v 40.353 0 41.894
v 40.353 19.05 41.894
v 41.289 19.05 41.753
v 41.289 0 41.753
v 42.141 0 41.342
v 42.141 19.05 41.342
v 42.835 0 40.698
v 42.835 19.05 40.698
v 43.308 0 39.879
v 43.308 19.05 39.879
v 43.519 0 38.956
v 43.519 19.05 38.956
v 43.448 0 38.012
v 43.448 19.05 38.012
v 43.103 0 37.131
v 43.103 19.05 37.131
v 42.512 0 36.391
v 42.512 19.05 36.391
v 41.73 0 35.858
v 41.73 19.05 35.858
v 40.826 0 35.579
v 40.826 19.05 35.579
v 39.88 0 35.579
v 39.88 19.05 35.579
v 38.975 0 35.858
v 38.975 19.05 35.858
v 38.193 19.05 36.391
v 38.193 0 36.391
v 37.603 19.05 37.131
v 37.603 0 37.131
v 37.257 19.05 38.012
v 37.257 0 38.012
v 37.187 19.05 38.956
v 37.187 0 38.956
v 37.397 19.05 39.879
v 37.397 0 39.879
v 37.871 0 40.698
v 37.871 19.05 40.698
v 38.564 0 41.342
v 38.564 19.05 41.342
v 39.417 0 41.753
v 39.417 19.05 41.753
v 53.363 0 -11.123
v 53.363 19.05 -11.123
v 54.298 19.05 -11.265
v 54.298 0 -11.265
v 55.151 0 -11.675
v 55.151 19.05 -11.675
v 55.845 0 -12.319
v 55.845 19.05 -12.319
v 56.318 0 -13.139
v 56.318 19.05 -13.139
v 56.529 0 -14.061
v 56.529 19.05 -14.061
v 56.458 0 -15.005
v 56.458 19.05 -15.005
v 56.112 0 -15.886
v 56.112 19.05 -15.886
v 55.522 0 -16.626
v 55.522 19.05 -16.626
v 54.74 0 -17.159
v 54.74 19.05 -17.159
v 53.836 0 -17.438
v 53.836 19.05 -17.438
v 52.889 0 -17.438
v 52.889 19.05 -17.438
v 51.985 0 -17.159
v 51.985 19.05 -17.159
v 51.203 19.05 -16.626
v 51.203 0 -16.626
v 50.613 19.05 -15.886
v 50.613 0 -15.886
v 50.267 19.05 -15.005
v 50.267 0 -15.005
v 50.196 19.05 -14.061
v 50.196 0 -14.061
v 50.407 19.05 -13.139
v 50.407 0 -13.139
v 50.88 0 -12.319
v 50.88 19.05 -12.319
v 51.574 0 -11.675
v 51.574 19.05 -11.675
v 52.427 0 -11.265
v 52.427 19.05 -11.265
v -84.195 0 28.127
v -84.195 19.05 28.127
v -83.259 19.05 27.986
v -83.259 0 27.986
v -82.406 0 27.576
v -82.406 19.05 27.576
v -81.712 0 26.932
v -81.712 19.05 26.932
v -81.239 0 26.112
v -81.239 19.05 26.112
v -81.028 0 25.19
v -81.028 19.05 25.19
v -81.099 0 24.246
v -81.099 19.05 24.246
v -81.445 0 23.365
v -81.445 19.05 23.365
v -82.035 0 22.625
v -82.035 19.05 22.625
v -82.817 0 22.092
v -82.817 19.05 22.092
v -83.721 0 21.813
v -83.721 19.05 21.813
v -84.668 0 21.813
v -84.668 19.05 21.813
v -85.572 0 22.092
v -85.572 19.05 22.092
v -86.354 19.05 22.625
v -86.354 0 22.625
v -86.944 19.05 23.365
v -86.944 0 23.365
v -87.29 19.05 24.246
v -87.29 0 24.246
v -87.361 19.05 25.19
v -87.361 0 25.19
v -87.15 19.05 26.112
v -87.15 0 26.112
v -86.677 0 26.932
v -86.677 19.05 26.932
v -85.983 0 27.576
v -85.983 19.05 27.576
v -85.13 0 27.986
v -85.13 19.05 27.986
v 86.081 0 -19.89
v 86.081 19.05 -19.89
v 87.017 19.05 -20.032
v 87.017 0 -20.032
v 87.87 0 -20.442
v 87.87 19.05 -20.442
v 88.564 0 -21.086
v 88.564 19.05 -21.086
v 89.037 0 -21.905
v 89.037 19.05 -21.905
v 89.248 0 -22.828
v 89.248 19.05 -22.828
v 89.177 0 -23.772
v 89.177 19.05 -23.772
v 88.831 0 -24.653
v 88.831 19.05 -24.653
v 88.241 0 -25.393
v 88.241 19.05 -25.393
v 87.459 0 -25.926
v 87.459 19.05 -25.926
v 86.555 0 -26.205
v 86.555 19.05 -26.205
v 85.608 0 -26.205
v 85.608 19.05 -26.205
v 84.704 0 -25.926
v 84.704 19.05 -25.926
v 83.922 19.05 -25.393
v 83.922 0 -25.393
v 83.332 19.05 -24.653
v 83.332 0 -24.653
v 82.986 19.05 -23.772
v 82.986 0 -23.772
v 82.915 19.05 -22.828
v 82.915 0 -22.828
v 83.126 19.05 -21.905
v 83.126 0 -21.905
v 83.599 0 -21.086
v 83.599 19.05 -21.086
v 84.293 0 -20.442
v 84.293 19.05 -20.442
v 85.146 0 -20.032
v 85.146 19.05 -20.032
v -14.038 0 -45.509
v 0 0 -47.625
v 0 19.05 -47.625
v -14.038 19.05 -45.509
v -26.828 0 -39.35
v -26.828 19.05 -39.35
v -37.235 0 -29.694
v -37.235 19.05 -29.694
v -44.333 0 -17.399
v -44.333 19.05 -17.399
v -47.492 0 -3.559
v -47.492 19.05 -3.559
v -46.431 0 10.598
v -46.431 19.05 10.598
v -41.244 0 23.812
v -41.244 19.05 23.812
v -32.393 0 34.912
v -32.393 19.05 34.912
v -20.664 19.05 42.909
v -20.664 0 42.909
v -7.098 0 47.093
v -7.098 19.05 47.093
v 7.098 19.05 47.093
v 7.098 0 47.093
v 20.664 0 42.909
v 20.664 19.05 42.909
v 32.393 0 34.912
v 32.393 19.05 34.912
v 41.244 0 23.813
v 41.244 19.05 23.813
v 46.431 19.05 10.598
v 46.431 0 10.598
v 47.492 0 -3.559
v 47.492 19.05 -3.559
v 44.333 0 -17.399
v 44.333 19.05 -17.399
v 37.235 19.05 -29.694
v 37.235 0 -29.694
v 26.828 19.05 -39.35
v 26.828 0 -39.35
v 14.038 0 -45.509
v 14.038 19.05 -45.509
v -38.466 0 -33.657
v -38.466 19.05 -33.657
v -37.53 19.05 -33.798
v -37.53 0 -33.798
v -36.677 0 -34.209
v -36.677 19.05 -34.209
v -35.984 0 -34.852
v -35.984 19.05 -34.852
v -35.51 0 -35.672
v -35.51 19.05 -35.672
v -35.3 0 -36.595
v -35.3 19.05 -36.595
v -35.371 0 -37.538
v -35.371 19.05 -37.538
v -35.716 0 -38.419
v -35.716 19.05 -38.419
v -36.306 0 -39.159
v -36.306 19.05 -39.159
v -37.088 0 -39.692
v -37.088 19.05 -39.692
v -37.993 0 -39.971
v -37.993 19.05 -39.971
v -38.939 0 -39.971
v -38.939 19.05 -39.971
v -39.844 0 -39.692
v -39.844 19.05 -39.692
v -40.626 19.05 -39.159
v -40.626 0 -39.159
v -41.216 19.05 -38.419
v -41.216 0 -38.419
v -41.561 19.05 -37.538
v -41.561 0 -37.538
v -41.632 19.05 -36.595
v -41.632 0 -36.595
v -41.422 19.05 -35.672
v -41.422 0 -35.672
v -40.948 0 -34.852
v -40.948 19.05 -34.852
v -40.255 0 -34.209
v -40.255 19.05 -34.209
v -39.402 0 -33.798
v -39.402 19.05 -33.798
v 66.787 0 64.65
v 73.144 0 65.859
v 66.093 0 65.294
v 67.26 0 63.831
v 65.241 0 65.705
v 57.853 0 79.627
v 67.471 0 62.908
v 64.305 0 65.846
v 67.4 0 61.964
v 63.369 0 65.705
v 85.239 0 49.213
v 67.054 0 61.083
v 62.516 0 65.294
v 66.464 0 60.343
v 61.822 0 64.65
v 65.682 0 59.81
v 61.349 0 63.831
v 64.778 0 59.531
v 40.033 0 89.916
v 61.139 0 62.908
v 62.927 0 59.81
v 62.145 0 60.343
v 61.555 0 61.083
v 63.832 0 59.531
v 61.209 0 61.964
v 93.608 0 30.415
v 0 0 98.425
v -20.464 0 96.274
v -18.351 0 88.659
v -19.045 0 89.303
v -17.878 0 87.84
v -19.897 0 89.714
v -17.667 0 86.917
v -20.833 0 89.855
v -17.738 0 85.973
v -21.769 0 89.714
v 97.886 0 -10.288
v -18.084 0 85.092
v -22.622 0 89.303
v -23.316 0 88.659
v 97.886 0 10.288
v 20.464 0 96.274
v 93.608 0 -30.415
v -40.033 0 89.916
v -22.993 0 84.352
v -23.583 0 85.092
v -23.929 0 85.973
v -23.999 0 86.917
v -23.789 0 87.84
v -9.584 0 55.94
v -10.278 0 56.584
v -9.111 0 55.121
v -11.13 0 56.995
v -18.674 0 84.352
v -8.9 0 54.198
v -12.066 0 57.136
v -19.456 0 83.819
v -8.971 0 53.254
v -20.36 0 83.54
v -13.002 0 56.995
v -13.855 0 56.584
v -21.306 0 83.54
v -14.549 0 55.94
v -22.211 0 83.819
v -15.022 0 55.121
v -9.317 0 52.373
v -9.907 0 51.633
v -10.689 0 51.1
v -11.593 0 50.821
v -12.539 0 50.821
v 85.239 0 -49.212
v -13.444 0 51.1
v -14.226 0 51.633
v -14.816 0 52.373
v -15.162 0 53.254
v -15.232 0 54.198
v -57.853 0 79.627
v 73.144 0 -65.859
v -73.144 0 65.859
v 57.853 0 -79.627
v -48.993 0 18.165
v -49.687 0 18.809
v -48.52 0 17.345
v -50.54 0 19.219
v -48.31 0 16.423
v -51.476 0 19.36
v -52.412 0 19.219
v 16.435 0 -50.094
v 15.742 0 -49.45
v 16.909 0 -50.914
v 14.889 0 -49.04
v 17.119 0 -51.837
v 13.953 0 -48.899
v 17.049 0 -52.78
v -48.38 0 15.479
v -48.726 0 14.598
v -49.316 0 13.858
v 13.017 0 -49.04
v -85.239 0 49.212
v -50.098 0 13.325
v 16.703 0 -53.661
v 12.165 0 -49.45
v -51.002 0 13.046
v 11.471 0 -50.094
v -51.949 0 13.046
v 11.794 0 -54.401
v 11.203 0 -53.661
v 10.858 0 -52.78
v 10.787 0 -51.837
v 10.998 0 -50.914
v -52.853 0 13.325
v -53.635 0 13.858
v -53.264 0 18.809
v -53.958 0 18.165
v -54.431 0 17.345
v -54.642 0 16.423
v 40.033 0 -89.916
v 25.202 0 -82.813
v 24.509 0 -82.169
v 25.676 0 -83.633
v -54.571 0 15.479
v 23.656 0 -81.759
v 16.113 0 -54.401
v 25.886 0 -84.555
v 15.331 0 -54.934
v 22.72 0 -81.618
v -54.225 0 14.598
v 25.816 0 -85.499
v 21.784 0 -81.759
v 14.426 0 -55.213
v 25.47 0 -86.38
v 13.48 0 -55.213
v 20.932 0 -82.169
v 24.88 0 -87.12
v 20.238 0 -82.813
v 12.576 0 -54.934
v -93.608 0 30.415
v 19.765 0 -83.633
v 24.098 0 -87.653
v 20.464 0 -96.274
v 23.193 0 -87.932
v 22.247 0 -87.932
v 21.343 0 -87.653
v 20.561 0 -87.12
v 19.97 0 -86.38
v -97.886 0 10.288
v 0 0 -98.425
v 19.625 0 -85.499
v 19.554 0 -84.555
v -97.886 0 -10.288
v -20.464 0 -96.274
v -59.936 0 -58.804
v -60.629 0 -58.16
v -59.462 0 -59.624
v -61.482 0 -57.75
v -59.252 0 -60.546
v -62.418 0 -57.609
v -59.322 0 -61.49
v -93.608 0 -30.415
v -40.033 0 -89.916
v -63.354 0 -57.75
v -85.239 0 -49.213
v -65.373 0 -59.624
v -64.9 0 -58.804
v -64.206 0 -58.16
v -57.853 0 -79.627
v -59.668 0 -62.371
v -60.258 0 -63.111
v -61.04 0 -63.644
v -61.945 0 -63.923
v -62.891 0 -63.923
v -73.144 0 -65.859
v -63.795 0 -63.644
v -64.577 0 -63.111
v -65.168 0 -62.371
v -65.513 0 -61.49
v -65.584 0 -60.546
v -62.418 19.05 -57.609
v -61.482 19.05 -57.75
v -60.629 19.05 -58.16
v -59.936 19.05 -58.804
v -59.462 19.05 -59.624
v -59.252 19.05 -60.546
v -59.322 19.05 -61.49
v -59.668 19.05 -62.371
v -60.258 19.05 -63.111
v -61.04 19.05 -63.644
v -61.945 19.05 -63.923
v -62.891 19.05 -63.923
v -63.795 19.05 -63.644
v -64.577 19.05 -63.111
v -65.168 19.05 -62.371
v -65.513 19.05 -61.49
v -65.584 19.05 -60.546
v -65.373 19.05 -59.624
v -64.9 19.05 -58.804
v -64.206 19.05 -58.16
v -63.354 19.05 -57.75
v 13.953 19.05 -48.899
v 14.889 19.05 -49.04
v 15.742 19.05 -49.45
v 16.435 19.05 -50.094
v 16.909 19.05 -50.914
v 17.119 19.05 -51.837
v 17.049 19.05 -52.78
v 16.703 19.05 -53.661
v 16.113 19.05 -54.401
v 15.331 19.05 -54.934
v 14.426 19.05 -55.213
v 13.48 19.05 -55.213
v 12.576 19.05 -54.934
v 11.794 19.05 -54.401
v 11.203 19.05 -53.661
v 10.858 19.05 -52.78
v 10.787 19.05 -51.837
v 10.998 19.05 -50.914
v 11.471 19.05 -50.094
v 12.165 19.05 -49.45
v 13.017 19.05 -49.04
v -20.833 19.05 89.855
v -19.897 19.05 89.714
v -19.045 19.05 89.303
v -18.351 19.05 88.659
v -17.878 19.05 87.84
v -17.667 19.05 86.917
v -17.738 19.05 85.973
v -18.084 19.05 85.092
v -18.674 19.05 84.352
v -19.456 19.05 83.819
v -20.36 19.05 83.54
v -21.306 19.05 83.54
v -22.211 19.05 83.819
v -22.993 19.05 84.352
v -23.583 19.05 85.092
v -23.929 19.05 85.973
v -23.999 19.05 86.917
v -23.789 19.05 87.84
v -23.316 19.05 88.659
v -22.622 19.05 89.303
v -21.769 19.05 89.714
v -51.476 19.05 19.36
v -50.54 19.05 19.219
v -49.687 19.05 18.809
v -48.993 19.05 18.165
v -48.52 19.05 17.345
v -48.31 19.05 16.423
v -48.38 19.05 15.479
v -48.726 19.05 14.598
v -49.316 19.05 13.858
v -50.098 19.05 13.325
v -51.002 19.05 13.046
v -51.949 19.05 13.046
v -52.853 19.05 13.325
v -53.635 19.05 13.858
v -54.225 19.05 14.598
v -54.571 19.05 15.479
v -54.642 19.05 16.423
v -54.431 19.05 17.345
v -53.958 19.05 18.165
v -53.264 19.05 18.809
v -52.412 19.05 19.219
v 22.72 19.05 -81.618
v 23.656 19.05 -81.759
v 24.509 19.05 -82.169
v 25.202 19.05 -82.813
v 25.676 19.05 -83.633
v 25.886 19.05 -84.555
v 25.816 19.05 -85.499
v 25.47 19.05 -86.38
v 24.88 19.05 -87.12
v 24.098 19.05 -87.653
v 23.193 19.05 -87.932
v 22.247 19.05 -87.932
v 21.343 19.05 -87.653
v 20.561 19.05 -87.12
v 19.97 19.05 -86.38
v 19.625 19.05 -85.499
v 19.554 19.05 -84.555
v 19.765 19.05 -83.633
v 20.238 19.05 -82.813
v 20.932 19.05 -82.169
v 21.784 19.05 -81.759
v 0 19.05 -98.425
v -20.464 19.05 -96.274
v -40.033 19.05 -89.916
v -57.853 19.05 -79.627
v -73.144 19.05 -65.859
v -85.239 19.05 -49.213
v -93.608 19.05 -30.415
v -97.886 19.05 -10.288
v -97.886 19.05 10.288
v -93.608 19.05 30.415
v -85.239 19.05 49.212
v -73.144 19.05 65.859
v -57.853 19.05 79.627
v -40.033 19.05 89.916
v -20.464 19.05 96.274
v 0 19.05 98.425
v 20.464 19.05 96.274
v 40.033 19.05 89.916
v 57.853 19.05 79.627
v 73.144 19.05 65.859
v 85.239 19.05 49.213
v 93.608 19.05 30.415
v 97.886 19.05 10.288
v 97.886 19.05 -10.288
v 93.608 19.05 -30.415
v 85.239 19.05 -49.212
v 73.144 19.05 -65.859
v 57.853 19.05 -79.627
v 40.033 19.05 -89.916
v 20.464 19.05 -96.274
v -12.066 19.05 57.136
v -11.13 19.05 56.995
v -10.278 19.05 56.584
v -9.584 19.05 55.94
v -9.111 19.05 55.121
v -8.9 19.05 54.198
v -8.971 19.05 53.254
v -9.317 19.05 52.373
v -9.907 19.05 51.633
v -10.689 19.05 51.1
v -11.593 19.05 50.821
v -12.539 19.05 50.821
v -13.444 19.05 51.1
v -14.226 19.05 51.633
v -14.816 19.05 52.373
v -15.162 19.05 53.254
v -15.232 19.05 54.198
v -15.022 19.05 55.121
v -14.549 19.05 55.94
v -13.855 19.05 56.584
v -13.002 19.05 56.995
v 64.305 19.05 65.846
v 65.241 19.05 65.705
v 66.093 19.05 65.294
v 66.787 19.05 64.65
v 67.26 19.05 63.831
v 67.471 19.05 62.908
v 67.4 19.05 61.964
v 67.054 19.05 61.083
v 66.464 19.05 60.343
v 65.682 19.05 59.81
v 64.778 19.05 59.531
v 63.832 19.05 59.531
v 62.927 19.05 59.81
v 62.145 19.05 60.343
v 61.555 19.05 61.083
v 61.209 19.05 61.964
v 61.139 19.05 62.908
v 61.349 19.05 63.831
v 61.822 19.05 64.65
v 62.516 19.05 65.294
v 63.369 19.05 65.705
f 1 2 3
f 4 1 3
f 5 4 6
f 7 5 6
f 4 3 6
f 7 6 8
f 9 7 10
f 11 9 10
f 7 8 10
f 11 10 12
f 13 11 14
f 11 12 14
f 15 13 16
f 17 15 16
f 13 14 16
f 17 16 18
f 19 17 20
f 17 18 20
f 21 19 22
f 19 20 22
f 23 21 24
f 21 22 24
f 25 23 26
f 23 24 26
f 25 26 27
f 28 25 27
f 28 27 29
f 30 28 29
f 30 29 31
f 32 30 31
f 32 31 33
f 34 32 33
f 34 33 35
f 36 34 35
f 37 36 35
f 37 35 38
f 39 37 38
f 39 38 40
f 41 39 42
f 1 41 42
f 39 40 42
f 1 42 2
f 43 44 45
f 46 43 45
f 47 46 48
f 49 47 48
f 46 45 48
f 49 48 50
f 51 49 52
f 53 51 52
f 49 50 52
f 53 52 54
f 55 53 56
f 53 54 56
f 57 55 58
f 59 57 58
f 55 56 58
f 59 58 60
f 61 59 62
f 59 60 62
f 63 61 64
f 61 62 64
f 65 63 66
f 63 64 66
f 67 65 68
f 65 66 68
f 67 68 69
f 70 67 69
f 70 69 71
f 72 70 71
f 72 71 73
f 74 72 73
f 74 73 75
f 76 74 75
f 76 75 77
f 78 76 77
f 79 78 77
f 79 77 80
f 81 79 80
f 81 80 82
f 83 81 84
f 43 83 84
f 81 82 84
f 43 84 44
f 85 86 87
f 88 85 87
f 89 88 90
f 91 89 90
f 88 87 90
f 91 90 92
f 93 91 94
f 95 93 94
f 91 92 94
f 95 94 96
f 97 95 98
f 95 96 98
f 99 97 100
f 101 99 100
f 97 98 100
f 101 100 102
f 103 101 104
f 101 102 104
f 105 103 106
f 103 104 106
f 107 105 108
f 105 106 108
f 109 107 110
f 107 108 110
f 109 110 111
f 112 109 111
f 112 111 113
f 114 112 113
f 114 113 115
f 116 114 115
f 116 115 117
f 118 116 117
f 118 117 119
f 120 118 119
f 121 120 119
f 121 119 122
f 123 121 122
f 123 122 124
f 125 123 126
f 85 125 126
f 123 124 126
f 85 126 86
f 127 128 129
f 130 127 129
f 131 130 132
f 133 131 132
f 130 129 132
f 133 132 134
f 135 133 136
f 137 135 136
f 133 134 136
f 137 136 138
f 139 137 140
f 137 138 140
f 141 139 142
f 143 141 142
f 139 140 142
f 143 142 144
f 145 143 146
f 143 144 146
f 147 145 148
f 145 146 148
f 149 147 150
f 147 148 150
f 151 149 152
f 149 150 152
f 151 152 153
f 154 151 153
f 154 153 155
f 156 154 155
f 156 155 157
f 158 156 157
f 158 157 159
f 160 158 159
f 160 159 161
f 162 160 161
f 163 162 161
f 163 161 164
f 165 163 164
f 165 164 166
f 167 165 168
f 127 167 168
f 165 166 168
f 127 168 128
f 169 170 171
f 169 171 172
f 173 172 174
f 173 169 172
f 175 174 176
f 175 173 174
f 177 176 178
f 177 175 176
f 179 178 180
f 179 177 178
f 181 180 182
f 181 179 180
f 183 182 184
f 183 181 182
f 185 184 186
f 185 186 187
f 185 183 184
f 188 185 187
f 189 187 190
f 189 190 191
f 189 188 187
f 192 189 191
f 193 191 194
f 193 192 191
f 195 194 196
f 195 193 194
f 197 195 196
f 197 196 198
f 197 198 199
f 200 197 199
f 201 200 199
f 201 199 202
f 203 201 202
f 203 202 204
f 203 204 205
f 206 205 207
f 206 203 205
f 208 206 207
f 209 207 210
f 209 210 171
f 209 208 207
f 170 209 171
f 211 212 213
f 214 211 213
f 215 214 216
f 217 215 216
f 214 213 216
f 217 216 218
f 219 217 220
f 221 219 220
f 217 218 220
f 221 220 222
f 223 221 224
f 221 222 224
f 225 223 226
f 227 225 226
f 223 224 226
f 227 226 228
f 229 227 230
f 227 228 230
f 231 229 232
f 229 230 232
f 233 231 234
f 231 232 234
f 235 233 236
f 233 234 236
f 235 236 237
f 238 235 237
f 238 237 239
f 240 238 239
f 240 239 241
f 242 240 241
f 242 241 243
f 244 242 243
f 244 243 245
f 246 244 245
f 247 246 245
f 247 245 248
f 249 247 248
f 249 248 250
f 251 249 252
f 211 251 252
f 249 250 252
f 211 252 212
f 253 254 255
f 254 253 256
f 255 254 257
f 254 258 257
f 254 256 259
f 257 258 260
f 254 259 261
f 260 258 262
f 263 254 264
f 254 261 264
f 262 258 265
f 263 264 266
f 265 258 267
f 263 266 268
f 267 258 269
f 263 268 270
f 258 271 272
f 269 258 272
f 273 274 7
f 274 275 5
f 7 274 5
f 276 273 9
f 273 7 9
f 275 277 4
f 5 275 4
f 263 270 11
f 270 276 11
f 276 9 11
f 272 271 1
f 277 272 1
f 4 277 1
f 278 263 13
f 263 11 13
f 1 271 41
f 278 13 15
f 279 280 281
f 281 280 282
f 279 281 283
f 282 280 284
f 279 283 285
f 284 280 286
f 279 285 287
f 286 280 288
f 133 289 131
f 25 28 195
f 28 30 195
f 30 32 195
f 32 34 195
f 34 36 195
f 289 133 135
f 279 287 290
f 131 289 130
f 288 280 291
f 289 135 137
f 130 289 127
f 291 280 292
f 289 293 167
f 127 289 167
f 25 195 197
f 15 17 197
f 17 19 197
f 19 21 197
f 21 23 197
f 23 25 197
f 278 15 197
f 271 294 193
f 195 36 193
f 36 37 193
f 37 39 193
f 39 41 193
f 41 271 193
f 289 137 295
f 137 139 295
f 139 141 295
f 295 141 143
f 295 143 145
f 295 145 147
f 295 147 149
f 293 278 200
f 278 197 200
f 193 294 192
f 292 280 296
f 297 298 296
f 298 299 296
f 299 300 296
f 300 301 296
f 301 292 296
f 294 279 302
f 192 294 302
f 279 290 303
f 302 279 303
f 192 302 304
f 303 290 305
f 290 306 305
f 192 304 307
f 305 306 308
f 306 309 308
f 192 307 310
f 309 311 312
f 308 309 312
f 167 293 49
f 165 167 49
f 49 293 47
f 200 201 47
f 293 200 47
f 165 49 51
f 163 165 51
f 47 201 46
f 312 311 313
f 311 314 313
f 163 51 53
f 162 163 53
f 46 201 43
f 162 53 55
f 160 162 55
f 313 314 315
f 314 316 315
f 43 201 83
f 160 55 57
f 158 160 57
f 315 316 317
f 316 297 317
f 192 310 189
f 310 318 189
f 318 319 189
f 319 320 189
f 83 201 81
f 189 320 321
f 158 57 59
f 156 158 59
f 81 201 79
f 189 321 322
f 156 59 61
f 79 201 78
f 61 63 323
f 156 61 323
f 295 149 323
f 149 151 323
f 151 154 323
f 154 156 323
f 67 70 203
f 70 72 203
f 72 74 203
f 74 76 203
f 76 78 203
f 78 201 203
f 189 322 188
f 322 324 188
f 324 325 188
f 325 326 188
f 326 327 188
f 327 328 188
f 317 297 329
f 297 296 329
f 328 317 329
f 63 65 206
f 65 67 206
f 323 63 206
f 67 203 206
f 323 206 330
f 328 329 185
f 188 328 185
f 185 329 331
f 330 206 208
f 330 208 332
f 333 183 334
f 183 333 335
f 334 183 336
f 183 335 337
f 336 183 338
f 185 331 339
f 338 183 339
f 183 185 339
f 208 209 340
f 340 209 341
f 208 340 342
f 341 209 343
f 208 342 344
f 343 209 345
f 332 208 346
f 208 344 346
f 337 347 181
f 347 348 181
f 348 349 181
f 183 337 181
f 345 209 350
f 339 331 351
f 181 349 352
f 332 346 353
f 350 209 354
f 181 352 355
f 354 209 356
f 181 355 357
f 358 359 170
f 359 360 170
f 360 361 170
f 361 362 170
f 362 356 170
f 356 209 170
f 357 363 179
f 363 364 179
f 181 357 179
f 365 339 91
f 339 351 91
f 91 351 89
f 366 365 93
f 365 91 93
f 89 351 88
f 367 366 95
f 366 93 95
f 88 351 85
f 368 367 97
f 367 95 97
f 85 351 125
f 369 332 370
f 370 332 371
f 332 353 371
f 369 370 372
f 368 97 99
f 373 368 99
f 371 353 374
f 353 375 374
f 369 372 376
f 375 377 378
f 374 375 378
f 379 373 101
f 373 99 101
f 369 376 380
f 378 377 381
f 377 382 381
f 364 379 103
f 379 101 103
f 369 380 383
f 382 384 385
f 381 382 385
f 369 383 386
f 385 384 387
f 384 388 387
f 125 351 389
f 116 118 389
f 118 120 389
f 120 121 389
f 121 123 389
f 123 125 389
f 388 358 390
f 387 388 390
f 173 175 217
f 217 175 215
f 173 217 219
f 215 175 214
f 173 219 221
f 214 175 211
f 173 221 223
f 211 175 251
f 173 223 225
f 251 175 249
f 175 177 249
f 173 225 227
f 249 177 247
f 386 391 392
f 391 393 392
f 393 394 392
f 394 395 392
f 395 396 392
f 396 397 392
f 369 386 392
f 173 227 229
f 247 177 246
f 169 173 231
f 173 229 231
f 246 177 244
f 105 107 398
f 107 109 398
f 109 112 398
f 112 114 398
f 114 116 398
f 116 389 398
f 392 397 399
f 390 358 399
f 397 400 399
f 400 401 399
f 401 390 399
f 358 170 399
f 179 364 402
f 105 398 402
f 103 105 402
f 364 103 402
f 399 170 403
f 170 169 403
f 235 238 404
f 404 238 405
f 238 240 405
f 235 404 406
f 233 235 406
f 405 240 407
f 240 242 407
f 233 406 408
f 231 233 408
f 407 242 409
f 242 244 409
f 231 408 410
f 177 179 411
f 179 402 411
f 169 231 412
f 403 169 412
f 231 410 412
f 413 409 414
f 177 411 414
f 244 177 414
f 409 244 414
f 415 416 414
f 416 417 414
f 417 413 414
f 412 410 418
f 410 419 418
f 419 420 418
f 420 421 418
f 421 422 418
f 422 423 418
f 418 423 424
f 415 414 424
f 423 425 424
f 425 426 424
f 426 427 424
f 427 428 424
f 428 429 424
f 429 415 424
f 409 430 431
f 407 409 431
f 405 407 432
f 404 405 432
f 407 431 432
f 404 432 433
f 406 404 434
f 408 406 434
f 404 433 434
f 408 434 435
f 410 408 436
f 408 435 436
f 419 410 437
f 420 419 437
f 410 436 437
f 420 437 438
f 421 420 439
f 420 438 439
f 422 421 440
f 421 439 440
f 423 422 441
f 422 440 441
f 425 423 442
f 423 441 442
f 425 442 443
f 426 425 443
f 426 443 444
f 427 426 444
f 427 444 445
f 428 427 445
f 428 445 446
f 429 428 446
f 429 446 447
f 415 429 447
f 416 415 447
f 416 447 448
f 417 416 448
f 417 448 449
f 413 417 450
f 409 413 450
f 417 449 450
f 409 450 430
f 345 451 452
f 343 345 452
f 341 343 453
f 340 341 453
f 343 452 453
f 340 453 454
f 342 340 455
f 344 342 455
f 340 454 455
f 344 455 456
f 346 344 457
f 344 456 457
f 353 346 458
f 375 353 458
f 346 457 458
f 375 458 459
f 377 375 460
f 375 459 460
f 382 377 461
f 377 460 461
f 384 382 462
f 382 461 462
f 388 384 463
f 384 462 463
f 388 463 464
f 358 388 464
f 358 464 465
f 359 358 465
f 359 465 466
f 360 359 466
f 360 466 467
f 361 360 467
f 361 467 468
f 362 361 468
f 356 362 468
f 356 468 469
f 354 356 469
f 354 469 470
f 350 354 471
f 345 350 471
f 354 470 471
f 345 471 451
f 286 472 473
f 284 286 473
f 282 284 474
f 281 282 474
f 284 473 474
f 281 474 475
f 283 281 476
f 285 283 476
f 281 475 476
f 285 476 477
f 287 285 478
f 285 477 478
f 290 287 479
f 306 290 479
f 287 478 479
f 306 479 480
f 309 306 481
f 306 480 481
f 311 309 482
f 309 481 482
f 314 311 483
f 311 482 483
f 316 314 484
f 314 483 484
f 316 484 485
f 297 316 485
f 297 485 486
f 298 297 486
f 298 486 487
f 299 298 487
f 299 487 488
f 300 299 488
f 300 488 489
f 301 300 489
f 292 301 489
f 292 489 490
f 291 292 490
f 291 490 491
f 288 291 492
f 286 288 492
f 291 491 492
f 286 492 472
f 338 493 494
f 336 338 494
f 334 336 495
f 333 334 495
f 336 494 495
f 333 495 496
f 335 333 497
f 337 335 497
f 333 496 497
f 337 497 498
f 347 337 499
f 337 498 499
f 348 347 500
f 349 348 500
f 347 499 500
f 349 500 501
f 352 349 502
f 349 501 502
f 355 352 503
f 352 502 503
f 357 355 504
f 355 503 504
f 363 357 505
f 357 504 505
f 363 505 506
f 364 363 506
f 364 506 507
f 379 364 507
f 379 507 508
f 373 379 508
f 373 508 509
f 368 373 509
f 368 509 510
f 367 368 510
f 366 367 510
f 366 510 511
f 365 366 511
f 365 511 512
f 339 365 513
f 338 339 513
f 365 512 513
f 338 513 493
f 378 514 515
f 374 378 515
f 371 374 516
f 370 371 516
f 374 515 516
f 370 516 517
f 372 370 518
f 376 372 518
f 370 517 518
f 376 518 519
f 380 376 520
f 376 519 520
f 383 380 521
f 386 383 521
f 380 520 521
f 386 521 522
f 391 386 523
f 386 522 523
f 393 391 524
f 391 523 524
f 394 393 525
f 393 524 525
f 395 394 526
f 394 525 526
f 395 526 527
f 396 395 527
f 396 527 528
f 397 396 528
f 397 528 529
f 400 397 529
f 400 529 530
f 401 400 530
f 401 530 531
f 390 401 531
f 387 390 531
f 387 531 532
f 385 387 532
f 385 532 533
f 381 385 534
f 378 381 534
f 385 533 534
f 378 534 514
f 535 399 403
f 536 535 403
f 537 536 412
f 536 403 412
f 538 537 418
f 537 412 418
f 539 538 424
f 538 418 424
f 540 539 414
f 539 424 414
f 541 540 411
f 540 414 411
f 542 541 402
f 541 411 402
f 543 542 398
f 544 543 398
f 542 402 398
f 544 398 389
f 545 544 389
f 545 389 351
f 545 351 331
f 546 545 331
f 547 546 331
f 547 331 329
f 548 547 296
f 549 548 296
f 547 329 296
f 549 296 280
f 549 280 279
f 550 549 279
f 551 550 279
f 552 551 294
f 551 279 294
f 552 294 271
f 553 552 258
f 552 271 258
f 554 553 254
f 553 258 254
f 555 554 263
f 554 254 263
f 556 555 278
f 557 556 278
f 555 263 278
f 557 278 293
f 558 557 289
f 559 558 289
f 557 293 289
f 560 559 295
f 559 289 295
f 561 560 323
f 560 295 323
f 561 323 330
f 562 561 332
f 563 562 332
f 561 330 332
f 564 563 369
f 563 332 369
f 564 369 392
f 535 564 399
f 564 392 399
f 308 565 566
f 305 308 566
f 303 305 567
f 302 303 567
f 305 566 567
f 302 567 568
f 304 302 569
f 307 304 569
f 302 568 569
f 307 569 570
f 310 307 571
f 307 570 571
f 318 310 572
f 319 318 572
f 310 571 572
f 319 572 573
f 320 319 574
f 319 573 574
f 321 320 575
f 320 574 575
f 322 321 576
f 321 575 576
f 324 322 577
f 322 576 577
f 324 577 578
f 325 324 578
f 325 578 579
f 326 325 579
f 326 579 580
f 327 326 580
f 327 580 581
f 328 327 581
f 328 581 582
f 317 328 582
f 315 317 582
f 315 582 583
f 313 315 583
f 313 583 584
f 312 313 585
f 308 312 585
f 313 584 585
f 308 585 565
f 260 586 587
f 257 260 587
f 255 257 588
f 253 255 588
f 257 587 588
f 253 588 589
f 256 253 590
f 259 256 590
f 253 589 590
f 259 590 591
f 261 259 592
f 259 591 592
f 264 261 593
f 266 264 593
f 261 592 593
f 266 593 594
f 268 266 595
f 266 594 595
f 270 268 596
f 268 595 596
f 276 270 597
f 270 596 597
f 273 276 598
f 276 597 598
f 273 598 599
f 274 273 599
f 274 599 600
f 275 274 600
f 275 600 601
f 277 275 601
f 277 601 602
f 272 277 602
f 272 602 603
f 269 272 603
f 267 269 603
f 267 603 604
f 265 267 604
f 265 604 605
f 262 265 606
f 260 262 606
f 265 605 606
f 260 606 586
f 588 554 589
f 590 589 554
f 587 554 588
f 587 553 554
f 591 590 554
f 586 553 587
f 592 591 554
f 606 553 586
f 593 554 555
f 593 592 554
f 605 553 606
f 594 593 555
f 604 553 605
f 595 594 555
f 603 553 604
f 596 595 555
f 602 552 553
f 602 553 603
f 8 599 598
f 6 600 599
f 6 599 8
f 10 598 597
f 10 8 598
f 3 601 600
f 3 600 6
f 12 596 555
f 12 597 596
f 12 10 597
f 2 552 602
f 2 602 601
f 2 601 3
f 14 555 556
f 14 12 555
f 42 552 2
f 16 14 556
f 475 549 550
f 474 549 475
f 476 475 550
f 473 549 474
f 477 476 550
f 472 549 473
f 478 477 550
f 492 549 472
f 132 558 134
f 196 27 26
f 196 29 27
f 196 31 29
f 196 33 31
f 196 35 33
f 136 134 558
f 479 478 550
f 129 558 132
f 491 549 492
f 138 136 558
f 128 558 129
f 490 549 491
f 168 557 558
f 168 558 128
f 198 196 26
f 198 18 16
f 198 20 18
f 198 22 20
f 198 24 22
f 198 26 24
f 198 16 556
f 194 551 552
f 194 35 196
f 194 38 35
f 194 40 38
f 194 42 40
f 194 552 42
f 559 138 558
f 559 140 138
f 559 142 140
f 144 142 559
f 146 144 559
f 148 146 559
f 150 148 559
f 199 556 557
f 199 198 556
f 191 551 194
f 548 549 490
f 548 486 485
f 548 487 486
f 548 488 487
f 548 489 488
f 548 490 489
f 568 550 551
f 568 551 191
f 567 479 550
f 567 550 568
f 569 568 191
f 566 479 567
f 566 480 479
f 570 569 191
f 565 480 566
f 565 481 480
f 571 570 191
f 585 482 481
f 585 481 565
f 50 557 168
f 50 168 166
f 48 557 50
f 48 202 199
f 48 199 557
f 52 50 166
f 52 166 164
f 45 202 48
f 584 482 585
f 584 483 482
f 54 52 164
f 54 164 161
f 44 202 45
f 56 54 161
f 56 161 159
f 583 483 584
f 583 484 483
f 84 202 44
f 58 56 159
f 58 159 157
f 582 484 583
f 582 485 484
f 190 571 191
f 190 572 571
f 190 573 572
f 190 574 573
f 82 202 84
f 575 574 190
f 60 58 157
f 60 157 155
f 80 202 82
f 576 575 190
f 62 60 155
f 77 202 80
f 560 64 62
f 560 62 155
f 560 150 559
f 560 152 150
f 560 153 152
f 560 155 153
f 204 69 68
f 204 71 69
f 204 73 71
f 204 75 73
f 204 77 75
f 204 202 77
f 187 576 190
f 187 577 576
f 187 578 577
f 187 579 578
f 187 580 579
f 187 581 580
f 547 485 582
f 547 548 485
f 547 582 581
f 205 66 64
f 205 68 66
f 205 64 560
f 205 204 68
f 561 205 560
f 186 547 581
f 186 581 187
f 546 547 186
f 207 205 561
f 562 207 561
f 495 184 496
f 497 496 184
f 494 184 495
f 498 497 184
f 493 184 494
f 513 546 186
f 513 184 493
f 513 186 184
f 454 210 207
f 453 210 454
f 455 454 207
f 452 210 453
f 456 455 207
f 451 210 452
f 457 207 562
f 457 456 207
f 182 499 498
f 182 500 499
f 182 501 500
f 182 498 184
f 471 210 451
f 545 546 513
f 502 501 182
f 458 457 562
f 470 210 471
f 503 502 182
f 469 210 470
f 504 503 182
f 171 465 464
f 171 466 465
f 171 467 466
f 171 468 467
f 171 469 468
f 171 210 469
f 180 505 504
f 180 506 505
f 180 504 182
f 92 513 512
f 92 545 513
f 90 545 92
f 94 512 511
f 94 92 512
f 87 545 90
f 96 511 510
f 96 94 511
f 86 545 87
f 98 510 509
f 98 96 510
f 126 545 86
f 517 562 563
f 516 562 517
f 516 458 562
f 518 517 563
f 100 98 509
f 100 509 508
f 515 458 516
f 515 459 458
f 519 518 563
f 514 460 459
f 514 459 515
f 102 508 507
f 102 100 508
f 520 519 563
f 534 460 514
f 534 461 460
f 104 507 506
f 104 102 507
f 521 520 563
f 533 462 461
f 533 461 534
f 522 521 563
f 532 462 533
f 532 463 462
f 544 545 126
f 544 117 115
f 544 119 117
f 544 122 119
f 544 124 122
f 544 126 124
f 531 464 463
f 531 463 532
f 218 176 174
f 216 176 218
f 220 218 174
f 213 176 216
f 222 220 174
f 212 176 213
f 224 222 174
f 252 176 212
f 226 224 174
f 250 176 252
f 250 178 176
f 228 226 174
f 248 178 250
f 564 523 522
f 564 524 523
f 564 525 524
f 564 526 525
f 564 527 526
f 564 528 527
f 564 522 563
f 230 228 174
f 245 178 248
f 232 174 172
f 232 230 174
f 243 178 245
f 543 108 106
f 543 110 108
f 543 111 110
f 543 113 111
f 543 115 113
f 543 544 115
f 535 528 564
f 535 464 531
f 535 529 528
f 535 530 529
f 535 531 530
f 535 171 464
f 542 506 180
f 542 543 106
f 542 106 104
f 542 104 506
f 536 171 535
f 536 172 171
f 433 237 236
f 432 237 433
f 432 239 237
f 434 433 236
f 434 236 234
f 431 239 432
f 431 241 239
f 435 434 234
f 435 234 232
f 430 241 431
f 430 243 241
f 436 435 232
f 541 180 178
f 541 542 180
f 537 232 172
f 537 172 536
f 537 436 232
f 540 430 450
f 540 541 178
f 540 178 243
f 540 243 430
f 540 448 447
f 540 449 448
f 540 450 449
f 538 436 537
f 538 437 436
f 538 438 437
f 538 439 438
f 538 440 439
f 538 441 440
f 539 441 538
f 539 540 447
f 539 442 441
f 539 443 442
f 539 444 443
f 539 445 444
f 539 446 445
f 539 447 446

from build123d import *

# Parameters (mm, degrees)
SKETCH1_R           = 98.425
SKETCH1_R_2         = 47.625
BOSS_EXTRUDE1_DEPTH = 19.05
SKETCH2_R           = 3.175
CUT_EXTRUDE1_DEPTH  = 19.05


with BuildPart() as part:
    # Sketch1 → Boss-Extrude1 (new body)
    with BuildSketch(Plane(origin=(0, 0, 0), x_dir=(1, 0, 0), z_dir=(0, 1, 0))):
        with Locations(Location((0, 0, 0), (0, 0, 90))):
            Circle(SKETCH1_R)
        with Locations(Location((0, 0, 0), (0, 0, 90))):
            Circle(SKETCH1_R_2, mode=Mode.SUBTRACT)
    extrude(amount=BOSS_EXTRUDE1_DEPTH)

    # Sketch2 → Cut-Extrude1 (cut)
    with BuildSketch(Plane(origin=(0, 19.05, 0), x_dir=(1, 0, 0), z_dir=(0, 1, 0))):
        with Locations(Location((53.362572273, 14.298458147, 0), (0, 0, 270))):
            Circle(SKETCH2_R)
        with Locations(Location((86.081449469, 23.065454869, 0), (0, 0, 270))):
            Circle(SKETCH2_R)
        with Locations(Location((40.352894367, -38.718786502, 0), (0, 0, 270))):
            Circle(SKETCH2_R)
        with Locations(Location((64.304774841, -62.670666976, 0), (0, 0, 270))):
            Circle(SKETCH2_R)
        with Locations(Location((-12.066225291, -53.960697264, 0), (0, 0, 270))):
            Circle(SKETCH2_R)
        with Locations(Location((-20.833222013, -86.67957446, 0), (0, 0, 270))):
            Circle(SKETCH2_R)
        with Locations(Location((-51.475667042, -16.185363378, 0), (0, 0, 270))):
            Circle(SKETCH2_R)
        with Locations(Location((-84.194544238, -24.9523601, 0), (0, 0, 270))):
            Circle(SKETCH2_R)
        with Locations(Location((-38.465989136, 36.831881271, 0), (0, 0, 270))):
            Circle(SKETCH2_R)
        with Locations(Location((-62.41786961, 60.783761745, 0), (0, 0, 270))):
            Circle(SKETCH2_R)
        with Locations(Location((13.953130522, 52.073792033, 0), (0, 0, 270))):
            Circle(SKETCH2_R)
        with Locations(Location((22.720127244, 84.792669229, 0), (0, 0, 270))):
            Circle(SKETCH2_R)
    extrude(amount=-CUT_EXTRUDE1_DEPTH, mode=Mode.SUBTRACT)


solid = part.part
